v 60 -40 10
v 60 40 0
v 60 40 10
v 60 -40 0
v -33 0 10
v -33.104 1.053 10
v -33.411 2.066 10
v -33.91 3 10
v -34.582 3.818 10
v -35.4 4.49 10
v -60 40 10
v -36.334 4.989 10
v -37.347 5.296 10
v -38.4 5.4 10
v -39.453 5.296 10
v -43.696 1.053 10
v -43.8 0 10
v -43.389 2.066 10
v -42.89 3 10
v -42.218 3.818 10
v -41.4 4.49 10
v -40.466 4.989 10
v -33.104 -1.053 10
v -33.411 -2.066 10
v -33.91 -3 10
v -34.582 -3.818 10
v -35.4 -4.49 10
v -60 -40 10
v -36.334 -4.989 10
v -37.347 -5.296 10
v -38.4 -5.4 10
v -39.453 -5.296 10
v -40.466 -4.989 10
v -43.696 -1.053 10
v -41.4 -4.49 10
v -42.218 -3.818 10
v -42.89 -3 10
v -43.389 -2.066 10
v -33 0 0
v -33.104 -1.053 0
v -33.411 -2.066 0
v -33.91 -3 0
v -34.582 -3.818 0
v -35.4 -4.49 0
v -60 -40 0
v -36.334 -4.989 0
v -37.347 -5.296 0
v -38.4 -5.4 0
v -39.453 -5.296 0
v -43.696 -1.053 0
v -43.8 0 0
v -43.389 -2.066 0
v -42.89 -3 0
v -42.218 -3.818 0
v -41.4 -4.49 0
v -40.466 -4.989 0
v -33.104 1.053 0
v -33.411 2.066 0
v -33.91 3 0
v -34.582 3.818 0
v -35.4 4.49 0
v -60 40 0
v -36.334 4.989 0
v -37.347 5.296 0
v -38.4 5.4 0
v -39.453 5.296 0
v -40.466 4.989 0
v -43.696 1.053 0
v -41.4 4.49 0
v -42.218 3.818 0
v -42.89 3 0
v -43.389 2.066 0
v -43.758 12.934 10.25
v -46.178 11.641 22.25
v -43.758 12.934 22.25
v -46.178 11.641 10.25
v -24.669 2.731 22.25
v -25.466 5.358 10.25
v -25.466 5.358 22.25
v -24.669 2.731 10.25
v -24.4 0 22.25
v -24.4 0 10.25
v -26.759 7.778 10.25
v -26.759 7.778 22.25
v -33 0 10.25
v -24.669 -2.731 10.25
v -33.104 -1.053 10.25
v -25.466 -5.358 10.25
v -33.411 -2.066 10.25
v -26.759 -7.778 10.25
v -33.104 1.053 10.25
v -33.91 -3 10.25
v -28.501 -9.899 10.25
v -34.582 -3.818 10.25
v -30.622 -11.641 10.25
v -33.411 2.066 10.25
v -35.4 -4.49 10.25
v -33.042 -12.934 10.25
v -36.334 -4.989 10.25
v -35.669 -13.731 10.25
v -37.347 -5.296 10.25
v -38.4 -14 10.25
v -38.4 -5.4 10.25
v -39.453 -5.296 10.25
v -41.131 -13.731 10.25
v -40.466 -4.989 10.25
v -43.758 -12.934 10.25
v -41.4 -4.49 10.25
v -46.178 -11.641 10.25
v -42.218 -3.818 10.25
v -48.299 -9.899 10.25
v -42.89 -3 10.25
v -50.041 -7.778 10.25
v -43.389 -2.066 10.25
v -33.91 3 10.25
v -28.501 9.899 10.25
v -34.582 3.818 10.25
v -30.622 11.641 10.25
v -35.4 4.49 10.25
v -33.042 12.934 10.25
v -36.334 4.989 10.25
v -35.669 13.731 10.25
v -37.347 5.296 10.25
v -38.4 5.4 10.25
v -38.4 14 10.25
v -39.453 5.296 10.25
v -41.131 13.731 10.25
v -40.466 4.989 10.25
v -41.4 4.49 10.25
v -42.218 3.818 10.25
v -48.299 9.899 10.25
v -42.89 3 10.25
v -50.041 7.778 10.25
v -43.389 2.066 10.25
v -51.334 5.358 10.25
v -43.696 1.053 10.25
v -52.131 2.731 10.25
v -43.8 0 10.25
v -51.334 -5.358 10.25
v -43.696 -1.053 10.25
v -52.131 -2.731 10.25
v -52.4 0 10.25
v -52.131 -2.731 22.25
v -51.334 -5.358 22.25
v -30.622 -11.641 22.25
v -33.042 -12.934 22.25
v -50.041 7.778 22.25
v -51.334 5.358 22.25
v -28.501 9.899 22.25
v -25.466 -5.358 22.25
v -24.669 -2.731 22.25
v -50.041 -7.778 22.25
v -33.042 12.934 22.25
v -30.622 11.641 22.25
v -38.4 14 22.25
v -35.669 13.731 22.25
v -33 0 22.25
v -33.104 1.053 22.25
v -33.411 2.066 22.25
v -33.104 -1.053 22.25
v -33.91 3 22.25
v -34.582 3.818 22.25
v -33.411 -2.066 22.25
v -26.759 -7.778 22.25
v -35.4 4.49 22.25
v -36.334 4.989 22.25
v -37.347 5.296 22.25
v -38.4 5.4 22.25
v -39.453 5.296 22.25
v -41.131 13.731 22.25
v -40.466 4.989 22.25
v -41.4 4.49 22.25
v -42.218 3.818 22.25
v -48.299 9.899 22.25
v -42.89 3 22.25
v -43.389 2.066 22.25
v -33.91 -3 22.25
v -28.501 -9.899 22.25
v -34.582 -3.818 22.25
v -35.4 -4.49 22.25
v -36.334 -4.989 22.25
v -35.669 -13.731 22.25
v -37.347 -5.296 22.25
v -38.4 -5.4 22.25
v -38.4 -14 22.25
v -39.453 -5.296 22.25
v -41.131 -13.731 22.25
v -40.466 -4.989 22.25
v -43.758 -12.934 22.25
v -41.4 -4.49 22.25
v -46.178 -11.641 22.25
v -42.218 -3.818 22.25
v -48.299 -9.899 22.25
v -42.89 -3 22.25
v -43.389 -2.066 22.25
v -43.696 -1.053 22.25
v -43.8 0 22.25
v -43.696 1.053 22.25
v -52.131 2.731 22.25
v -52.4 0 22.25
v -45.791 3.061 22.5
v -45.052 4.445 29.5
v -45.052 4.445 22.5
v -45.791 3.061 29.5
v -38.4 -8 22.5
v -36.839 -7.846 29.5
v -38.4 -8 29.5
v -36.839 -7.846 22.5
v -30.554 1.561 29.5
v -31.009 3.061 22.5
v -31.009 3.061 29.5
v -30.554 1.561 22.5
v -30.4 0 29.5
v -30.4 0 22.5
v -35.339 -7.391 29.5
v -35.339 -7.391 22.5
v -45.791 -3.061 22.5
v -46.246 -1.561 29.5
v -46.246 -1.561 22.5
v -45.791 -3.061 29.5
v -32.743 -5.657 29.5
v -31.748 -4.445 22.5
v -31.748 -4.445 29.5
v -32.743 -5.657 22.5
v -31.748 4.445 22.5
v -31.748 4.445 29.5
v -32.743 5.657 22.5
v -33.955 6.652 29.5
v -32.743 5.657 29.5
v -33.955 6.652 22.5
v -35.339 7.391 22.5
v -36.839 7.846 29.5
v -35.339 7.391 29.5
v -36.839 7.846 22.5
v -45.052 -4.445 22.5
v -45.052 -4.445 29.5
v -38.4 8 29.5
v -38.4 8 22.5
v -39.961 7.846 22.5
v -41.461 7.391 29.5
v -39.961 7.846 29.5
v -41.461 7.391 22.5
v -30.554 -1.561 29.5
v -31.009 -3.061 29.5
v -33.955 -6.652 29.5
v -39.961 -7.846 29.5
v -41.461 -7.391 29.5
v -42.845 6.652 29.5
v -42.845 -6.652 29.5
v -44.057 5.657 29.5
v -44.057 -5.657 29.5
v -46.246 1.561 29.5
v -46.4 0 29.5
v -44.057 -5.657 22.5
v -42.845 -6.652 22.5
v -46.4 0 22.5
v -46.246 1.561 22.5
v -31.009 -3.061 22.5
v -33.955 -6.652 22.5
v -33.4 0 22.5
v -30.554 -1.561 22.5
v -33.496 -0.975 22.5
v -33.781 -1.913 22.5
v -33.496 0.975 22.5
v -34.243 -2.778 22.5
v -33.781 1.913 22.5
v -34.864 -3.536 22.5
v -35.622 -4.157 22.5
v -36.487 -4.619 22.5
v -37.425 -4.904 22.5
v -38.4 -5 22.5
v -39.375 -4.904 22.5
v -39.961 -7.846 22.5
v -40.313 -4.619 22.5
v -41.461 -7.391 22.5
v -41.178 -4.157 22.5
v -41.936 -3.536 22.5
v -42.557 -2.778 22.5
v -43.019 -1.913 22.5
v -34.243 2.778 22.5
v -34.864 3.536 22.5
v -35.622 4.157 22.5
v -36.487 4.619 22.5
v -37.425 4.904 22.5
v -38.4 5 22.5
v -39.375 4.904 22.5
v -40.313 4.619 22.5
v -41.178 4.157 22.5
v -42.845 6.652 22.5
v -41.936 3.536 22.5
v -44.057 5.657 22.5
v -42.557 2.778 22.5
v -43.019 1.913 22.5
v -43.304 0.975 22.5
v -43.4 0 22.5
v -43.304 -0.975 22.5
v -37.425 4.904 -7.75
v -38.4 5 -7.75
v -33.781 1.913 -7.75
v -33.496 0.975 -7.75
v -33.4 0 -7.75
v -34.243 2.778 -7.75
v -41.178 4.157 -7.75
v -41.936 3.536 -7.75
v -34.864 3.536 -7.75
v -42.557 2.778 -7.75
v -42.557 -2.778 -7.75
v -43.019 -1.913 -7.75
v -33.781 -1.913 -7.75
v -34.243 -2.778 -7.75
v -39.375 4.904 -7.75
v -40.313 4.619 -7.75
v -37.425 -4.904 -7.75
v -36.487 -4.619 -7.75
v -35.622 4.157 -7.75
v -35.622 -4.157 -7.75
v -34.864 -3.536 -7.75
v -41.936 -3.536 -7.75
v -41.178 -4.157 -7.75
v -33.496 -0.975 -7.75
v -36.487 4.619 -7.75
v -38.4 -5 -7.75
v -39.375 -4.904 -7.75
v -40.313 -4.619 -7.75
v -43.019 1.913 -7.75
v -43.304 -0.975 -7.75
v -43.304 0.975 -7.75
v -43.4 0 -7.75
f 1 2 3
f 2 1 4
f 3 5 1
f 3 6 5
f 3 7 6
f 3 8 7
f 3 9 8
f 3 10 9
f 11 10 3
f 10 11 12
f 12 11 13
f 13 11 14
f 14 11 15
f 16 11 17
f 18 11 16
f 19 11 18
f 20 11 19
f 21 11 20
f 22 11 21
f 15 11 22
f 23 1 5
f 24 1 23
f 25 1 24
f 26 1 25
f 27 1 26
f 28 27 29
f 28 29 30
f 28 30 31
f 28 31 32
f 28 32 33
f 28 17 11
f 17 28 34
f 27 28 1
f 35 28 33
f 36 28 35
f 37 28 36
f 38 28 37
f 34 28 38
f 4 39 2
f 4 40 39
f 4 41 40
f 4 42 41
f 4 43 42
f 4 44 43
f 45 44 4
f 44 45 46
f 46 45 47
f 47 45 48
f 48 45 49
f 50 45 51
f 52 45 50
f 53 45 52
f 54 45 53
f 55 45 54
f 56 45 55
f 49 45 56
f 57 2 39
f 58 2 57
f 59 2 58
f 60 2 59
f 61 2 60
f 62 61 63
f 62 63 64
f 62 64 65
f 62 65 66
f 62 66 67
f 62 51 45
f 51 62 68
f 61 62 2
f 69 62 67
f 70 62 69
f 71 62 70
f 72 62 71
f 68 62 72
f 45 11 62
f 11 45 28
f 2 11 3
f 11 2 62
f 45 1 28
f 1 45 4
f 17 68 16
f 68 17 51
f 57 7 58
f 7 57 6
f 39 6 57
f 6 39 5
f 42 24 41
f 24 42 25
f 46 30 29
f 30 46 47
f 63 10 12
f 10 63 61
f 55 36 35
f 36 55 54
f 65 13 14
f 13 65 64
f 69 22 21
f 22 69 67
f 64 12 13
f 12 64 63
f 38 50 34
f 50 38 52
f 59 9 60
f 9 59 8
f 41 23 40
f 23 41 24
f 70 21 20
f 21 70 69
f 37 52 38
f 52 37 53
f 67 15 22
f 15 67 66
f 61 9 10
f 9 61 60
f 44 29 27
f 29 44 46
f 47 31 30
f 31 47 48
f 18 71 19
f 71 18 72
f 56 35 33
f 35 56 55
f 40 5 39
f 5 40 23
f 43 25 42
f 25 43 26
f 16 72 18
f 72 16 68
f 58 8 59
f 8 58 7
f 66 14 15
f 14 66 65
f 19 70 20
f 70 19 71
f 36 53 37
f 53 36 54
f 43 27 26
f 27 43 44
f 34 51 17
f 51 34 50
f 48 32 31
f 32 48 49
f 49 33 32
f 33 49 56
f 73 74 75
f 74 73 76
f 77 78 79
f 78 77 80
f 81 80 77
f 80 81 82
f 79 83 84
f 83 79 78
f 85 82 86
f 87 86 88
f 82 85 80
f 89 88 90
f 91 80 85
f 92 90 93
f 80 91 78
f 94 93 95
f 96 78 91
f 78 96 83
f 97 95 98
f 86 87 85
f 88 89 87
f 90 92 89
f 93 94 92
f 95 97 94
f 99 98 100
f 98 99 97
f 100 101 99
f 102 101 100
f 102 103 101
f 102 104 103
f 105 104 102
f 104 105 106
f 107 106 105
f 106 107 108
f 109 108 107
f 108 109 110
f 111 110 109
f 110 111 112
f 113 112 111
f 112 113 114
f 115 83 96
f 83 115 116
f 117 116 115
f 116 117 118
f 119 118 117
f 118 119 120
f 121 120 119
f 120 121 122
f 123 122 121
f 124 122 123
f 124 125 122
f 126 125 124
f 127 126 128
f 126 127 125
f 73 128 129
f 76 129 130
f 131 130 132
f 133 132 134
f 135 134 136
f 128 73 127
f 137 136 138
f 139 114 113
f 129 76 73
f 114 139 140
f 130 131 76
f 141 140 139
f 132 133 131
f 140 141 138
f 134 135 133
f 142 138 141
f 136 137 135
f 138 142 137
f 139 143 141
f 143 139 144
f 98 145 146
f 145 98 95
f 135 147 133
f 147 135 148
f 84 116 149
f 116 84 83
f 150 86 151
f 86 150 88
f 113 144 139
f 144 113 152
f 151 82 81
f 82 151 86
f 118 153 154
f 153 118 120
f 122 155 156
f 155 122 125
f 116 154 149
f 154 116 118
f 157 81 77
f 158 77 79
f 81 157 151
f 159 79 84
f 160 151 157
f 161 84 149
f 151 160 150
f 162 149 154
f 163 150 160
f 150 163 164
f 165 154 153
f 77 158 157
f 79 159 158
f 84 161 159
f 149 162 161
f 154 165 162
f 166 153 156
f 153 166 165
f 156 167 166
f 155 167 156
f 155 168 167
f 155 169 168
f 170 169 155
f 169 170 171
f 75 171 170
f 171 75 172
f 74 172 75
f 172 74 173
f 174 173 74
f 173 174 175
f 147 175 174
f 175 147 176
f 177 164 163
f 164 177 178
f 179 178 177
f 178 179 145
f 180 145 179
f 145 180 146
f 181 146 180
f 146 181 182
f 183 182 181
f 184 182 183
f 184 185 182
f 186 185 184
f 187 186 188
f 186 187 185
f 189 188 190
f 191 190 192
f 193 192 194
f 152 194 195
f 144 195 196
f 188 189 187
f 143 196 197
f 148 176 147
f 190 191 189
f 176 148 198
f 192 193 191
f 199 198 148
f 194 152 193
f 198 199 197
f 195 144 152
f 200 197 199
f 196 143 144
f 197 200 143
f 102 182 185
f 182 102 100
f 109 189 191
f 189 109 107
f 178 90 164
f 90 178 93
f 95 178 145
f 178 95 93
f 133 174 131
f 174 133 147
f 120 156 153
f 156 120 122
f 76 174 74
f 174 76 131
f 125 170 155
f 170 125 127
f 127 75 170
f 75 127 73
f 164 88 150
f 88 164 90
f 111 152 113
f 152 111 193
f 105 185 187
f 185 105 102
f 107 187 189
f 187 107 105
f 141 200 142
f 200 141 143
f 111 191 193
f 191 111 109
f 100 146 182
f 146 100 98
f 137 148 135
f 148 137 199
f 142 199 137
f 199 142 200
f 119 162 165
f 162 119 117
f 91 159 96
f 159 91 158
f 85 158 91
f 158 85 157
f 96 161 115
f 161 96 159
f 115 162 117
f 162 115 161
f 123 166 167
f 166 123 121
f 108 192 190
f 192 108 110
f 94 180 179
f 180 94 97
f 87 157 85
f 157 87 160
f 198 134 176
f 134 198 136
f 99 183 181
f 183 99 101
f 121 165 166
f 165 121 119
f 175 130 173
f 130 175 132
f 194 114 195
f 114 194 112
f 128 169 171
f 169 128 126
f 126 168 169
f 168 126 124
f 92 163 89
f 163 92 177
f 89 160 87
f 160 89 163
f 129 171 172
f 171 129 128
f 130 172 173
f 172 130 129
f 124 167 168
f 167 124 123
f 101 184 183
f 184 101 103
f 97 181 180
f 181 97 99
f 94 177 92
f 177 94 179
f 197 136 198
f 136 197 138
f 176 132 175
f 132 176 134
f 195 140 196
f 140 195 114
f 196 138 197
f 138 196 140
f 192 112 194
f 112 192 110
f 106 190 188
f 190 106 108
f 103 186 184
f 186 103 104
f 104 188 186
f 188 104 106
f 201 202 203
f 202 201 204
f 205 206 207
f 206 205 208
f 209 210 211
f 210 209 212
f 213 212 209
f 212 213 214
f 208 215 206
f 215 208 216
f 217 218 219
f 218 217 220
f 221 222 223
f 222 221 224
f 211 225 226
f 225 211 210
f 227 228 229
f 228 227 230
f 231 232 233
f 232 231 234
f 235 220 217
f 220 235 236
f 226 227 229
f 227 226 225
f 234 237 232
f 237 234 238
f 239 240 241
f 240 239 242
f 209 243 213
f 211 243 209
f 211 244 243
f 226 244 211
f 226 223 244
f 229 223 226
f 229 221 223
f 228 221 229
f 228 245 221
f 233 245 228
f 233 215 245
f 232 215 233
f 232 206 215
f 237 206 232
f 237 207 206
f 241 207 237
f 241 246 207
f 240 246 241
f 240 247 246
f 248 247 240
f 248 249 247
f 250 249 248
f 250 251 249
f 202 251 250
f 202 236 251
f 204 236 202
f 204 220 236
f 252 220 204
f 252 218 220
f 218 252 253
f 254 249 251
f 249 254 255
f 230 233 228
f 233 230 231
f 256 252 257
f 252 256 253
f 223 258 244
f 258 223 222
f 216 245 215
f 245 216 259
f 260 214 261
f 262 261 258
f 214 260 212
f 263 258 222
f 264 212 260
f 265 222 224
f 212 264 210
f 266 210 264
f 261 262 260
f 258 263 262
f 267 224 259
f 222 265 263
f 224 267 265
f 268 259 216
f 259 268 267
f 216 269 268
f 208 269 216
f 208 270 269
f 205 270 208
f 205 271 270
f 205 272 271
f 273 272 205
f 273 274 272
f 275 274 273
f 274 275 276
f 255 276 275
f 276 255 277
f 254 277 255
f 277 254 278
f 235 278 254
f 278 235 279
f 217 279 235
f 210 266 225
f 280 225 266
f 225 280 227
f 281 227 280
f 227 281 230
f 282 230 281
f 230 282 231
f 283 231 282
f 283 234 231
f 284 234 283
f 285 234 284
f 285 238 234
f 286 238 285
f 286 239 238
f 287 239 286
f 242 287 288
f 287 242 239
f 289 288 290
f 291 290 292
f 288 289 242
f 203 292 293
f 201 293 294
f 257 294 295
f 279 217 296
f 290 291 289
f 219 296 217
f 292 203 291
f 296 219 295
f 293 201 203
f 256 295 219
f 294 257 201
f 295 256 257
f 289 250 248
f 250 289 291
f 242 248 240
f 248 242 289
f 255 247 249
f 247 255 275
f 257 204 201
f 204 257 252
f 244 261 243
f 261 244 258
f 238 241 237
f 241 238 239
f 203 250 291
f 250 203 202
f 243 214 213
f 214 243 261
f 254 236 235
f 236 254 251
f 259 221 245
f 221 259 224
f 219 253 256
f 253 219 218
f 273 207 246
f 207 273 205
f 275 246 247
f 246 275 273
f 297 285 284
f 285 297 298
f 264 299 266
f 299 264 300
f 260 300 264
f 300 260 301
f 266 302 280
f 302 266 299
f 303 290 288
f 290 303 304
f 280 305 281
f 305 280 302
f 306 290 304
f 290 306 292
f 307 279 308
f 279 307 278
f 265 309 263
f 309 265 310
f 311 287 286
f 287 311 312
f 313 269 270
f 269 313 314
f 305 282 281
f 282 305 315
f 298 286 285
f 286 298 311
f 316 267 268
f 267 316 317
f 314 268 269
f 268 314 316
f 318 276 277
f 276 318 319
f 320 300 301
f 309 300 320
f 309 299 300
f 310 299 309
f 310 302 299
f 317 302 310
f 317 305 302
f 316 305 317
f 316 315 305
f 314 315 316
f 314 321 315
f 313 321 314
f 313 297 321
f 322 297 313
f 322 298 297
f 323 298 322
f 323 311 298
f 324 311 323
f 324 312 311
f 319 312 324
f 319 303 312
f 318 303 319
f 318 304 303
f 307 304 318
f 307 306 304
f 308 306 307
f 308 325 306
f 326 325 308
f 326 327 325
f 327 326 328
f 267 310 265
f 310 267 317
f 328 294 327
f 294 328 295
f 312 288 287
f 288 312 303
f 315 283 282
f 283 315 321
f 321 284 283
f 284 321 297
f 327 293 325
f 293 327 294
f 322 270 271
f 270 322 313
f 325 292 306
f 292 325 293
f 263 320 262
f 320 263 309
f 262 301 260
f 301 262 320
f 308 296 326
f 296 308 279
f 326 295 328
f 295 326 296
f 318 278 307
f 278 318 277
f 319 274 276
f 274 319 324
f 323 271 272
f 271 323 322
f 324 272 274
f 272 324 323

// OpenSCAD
$fn = 32;

// ------------------------------------------------------------------------
// Standoff columns: 1 d28 standoffs, bolts d10
// Every part is its own module, assembly() places them once.
// ------------------------------------------------------------------------

// --- part 1 ---
module base_plate() {
  difference() {
    translate([-60, -40, 0]) cube([120, 80, 10]);
    translate([-38.4, 0, -1]) cylinder(h = 12, d = 10.8);
  }
}

// --- part 2 ---
module spacer() {
  difference() {
      translate([0, 0, 0]) cylinder(h = 12, d = 28);
      translate([0, 0, -1]) cylinder(h = 14, d = 10.8);
    }
}

// --- part 3 ---
module bolt() {
  cylinder(h = 7, d = 16);
  translate([0, 0, -30.25]) cylinder(h = 30.25, d = 10);
}

// --- assembly ---
module assembly() {
  translate([0, 0, 0]) rotate([0, 0, 0]) base_plate();
  translate([-38.4, 0, 10.25]) rotate([0, 0, 0]) spacer();
  translate([-38.4, 0, 22.5]) rotate([0, 0, 0]) bolt();
}

assembly();
